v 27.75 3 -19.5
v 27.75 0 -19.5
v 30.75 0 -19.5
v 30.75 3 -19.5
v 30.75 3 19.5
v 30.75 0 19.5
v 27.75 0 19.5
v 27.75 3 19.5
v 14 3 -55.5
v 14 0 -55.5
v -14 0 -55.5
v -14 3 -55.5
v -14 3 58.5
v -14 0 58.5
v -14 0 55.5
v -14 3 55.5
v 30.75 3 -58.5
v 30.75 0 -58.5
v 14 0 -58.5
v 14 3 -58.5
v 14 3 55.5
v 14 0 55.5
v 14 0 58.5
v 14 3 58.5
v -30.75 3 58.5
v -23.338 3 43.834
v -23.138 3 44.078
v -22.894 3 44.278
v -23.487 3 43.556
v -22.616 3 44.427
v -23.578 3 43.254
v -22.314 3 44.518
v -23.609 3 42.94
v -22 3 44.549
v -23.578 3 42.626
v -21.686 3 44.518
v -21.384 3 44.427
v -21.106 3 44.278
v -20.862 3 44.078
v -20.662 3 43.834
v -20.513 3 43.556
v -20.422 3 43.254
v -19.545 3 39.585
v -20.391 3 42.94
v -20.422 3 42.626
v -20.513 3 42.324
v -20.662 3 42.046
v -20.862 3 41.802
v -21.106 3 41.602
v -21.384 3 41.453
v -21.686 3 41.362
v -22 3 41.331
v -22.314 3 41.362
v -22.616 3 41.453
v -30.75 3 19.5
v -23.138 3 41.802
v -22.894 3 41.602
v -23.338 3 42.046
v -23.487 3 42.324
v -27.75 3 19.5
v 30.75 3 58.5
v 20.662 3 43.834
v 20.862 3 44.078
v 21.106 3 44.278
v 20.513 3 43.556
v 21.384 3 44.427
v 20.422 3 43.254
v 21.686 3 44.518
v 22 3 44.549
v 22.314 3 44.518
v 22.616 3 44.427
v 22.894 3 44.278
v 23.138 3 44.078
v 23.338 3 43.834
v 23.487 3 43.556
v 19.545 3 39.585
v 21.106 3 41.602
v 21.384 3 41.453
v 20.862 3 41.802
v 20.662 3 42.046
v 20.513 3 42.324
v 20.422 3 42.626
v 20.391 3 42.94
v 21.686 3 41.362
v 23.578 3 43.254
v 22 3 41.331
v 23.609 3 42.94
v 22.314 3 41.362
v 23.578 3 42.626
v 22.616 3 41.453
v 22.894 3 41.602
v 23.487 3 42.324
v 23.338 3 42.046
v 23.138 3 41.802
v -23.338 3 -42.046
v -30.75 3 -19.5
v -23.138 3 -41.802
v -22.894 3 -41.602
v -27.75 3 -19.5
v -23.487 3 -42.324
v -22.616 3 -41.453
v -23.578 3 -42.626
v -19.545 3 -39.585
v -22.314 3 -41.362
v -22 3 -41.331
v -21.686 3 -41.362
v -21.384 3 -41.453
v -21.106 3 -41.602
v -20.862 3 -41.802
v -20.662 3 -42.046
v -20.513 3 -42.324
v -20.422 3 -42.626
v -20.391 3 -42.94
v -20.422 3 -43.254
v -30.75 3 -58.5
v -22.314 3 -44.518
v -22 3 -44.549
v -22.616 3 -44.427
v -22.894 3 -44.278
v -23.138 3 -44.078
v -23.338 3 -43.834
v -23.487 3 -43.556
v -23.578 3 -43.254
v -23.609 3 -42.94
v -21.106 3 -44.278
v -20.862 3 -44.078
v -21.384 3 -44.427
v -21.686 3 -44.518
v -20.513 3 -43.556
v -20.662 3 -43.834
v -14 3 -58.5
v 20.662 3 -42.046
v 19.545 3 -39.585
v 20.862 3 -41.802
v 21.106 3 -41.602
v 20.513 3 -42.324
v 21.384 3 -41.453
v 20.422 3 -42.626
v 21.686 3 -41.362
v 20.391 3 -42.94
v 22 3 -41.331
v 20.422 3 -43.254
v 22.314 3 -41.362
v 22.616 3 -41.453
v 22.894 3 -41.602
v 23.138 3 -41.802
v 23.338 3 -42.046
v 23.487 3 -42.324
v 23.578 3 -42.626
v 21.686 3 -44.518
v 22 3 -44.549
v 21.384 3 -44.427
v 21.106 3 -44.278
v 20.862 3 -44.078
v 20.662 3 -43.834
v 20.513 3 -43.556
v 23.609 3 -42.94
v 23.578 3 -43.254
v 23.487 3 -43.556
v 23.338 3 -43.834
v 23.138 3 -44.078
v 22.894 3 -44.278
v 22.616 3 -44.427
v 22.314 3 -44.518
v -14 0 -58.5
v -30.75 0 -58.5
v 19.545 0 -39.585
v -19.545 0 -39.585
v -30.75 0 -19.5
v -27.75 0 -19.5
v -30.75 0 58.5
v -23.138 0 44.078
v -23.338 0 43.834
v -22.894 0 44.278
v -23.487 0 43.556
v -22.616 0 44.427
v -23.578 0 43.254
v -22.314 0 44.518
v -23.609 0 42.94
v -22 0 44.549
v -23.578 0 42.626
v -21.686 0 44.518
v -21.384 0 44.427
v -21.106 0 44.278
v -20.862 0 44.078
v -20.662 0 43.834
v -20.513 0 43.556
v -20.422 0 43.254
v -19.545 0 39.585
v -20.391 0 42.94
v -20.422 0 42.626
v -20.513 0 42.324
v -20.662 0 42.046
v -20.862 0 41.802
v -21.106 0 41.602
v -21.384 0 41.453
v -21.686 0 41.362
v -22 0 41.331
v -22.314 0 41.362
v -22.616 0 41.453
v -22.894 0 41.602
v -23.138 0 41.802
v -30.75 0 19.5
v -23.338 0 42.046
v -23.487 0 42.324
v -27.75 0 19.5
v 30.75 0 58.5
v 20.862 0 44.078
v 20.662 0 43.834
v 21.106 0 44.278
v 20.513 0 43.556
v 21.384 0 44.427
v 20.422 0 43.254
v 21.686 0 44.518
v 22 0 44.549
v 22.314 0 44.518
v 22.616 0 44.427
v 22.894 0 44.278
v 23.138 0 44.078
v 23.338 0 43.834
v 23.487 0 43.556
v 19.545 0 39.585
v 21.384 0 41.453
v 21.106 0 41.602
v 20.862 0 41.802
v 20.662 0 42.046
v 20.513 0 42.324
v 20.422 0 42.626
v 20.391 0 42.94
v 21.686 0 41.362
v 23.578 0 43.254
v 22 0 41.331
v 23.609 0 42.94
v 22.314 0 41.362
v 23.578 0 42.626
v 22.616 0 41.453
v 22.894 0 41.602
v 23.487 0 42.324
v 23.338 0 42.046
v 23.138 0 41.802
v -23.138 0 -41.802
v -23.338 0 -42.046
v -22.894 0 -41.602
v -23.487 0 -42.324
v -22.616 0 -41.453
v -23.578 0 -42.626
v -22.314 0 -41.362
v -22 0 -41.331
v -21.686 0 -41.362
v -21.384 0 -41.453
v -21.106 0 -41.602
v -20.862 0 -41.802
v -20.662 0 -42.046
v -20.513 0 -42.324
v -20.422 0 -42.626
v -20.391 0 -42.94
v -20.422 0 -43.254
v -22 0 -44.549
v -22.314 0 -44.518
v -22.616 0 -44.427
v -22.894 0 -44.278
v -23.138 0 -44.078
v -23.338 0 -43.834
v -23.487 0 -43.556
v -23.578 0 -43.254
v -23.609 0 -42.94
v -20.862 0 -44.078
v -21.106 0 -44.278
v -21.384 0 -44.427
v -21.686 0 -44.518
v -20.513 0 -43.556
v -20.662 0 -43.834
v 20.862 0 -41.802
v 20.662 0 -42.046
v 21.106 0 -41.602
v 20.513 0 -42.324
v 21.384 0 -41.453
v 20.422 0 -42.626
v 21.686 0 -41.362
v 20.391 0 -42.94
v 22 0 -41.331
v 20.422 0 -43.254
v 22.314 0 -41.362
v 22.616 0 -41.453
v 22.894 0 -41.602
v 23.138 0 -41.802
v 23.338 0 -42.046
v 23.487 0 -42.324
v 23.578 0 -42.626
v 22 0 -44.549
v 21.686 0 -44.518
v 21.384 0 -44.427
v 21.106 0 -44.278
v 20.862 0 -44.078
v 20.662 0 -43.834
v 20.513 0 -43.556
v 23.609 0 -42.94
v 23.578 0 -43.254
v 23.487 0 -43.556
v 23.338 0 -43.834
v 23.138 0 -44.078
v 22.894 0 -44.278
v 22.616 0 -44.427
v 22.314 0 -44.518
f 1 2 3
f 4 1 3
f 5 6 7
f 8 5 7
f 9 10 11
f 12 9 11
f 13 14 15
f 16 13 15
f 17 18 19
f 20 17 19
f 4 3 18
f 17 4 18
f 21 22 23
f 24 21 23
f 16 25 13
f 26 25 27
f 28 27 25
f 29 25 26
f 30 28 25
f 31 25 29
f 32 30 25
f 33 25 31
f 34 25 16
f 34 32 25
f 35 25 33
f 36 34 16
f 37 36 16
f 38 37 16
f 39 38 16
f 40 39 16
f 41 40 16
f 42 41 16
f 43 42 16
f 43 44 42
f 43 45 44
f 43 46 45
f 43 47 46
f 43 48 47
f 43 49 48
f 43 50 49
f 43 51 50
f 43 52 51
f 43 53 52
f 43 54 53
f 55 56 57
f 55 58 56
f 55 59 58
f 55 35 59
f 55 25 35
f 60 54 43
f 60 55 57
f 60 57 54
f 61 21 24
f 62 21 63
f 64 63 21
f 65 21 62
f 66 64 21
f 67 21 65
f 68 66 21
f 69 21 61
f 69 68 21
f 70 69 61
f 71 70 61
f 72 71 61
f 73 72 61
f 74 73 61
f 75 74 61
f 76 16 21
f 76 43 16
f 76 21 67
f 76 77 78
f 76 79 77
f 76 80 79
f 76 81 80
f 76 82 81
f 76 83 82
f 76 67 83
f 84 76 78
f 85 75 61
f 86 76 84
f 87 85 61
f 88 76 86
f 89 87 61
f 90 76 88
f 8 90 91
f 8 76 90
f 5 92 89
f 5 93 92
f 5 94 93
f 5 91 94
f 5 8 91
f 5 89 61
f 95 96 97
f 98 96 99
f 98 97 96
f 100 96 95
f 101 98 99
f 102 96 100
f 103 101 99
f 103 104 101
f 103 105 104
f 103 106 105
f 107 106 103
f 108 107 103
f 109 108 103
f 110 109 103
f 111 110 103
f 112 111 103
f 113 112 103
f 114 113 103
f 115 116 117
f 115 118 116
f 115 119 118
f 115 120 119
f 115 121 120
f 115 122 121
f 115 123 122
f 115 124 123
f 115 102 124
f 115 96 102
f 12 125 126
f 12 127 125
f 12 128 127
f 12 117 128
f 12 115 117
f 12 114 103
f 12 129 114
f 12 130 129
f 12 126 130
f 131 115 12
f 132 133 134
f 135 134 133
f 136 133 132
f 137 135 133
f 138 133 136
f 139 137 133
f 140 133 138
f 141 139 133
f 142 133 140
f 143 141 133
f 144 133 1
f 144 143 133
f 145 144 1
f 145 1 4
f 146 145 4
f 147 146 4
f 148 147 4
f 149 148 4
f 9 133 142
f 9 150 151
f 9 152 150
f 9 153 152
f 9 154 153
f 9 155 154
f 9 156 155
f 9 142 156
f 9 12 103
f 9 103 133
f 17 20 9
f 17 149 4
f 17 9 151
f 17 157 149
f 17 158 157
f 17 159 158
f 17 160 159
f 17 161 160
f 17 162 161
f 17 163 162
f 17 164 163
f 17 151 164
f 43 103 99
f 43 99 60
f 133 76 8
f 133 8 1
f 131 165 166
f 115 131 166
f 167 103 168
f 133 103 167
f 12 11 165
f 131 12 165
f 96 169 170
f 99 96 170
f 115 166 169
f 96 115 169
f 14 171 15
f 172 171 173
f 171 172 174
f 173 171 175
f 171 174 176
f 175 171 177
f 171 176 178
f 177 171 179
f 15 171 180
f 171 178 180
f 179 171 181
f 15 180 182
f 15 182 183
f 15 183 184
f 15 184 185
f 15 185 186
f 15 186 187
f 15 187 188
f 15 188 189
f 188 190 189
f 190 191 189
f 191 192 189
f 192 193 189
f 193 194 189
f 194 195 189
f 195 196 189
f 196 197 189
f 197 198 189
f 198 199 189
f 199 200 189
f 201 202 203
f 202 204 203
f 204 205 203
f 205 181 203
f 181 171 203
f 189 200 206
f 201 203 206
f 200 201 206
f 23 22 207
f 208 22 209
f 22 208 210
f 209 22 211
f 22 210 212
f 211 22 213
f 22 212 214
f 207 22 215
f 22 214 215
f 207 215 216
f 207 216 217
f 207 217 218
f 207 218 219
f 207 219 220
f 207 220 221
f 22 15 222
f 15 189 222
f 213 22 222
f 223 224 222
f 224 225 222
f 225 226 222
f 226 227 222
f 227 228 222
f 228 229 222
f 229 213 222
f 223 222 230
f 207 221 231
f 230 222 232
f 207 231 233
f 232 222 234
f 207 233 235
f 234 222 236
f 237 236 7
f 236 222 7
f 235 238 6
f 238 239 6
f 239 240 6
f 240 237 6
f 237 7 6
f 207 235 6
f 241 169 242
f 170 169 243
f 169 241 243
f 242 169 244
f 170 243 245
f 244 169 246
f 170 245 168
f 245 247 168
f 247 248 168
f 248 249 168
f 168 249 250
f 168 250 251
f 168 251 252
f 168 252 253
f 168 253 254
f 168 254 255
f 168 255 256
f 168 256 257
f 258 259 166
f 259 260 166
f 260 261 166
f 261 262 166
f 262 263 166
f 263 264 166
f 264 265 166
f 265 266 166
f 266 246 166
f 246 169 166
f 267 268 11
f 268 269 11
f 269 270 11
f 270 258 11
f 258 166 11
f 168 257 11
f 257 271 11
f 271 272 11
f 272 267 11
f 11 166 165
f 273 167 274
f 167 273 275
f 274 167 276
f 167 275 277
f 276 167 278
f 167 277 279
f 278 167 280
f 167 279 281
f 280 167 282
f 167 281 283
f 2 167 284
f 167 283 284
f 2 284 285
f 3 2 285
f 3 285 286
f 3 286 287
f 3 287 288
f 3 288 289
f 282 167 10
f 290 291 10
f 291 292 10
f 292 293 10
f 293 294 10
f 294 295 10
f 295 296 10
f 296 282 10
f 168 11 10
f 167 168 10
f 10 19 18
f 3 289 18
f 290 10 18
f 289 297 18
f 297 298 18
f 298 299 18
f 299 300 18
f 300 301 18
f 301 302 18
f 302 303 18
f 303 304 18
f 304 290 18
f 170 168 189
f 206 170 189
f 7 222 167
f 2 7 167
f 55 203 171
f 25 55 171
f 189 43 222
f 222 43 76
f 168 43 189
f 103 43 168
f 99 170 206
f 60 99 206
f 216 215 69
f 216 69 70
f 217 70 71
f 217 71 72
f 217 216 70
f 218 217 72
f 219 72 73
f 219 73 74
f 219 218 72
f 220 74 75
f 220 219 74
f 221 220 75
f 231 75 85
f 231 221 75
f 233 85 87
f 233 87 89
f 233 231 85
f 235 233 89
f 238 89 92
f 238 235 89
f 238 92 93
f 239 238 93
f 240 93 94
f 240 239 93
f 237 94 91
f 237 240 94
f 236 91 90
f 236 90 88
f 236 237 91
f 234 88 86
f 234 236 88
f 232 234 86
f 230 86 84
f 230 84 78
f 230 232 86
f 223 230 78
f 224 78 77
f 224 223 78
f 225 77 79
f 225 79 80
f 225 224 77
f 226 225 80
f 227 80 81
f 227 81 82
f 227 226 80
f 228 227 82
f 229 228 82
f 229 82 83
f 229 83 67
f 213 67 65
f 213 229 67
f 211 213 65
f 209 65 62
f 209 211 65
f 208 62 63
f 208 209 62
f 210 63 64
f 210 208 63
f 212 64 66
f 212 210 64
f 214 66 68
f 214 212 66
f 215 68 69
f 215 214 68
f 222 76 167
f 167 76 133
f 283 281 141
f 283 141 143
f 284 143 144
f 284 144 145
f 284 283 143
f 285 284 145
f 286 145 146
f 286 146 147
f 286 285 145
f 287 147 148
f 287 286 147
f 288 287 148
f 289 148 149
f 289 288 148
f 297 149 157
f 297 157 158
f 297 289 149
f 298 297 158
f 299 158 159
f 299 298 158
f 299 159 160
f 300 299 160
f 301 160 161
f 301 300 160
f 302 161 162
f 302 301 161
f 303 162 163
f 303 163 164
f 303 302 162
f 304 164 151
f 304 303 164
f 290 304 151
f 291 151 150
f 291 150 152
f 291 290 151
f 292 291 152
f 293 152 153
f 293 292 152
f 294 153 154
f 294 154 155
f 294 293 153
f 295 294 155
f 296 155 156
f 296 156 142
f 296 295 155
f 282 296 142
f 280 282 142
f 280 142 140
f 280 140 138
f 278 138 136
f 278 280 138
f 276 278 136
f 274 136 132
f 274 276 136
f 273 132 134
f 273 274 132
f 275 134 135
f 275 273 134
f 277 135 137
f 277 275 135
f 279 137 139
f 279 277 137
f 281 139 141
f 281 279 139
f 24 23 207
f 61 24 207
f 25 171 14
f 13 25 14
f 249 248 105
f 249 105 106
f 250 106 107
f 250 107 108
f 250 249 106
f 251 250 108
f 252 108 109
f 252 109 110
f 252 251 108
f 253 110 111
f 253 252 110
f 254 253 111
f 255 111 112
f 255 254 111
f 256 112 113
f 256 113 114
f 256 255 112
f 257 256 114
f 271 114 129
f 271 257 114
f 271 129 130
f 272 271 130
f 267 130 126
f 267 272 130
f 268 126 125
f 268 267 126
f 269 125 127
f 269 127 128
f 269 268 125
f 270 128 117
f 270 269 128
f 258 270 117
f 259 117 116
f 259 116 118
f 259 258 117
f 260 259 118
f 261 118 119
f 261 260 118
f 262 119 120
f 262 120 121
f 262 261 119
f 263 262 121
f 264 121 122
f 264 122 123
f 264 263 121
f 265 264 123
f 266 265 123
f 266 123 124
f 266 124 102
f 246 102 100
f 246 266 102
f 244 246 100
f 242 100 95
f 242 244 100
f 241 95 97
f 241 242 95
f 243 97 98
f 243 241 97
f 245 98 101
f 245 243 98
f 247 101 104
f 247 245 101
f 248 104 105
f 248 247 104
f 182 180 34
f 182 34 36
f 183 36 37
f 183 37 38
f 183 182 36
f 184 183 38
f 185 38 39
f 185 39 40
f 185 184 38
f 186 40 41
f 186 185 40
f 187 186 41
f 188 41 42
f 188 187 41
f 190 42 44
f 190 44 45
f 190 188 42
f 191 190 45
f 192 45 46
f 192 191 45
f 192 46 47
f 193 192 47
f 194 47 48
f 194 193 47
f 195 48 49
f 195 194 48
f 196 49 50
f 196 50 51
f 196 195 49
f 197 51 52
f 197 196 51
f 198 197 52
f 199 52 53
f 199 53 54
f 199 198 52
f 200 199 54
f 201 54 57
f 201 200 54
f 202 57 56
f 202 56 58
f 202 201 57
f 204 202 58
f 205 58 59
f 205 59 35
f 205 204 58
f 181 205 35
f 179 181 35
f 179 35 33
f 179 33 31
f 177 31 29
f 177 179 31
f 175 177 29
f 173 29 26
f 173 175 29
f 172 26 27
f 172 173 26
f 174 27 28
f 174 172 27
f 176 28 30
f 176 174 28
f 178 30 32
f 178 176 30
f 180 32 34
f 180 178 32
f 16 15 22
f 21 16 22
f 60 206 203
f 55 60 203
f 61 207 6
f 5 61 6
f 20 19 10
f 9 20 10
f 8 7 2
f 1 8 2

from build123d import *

# Parameters (mm, degrees)
SKETCH1_R           = 1.609204822
BOSS_EXTRUDE1_DEPTH = 3
SKETCH2_W           = 39.09
SKETCH2_H           = 79.17
CUT_EXTRUDE1_DEPTH  = 67.15748257


with BuildPart() as part:
    # Sketch1 → Boss-Extrude1 (new body)
    with BuildSketch(Plane(origin=(0, 0, 0), x_dir=(1, 0, 0), z_dir=(0, 1, 0))):
        Polygon((-30.75, 58.5), (-30.75, 19.5), (-27.75, 19.5), (-27.75, -19.5), (-30.75, -19.5), (-30.75, -58.5), (-14, -58.5), (-14, -55.5), (14, -55.5), (14, -58.5), (30.75, -58.5), (30.75, -19.5), (27.75, -19.5), (27.75, 19.5), (30.75, 19.5), (30.75, 58.5), (14, 58.5), (14, 55.5), (-14, 55.5), (-14, 58.5), align=None)
        with Locations(Location((-22, -42.94, 0), (0, 0, 270))):
            Circle(SKETCH1_R, mode=Mode.SUBTRACT)
        with Locations(Location((22, -42.94, 0), (0, 0, 270))):
            Circle(SKETCH1_R, mode=Mode.SUBTRACT)
        with Locations(Location((22, 42.94, 0), (0, 0, 270))):
            Circle(SKETCH1_R, mode=Mode.SUBTRACT)
        with Locations(Location((-22, 42.94, 0), (0, 0, 270))):
            Circle(SKETCH1_R, mode=Mode.SUBTRACT)
    extrude(amount=BOSS_EXTRUDE1_DEPTH)

    # Sketch2 → Cut-Extrude1 (cut, through all)
    with BuildSketch(Plane(origin=(0, 3, 0), x_dir=(1, 0, 0), z_dir=(0, 1, 0))):
        Rectangle(SKETCH2_W, SKETCH2_H)
    extrude(amount=-CUT_EXTRUDE1_DEPTH, mode=Mode.SUBTRACT)


solid = part.part
